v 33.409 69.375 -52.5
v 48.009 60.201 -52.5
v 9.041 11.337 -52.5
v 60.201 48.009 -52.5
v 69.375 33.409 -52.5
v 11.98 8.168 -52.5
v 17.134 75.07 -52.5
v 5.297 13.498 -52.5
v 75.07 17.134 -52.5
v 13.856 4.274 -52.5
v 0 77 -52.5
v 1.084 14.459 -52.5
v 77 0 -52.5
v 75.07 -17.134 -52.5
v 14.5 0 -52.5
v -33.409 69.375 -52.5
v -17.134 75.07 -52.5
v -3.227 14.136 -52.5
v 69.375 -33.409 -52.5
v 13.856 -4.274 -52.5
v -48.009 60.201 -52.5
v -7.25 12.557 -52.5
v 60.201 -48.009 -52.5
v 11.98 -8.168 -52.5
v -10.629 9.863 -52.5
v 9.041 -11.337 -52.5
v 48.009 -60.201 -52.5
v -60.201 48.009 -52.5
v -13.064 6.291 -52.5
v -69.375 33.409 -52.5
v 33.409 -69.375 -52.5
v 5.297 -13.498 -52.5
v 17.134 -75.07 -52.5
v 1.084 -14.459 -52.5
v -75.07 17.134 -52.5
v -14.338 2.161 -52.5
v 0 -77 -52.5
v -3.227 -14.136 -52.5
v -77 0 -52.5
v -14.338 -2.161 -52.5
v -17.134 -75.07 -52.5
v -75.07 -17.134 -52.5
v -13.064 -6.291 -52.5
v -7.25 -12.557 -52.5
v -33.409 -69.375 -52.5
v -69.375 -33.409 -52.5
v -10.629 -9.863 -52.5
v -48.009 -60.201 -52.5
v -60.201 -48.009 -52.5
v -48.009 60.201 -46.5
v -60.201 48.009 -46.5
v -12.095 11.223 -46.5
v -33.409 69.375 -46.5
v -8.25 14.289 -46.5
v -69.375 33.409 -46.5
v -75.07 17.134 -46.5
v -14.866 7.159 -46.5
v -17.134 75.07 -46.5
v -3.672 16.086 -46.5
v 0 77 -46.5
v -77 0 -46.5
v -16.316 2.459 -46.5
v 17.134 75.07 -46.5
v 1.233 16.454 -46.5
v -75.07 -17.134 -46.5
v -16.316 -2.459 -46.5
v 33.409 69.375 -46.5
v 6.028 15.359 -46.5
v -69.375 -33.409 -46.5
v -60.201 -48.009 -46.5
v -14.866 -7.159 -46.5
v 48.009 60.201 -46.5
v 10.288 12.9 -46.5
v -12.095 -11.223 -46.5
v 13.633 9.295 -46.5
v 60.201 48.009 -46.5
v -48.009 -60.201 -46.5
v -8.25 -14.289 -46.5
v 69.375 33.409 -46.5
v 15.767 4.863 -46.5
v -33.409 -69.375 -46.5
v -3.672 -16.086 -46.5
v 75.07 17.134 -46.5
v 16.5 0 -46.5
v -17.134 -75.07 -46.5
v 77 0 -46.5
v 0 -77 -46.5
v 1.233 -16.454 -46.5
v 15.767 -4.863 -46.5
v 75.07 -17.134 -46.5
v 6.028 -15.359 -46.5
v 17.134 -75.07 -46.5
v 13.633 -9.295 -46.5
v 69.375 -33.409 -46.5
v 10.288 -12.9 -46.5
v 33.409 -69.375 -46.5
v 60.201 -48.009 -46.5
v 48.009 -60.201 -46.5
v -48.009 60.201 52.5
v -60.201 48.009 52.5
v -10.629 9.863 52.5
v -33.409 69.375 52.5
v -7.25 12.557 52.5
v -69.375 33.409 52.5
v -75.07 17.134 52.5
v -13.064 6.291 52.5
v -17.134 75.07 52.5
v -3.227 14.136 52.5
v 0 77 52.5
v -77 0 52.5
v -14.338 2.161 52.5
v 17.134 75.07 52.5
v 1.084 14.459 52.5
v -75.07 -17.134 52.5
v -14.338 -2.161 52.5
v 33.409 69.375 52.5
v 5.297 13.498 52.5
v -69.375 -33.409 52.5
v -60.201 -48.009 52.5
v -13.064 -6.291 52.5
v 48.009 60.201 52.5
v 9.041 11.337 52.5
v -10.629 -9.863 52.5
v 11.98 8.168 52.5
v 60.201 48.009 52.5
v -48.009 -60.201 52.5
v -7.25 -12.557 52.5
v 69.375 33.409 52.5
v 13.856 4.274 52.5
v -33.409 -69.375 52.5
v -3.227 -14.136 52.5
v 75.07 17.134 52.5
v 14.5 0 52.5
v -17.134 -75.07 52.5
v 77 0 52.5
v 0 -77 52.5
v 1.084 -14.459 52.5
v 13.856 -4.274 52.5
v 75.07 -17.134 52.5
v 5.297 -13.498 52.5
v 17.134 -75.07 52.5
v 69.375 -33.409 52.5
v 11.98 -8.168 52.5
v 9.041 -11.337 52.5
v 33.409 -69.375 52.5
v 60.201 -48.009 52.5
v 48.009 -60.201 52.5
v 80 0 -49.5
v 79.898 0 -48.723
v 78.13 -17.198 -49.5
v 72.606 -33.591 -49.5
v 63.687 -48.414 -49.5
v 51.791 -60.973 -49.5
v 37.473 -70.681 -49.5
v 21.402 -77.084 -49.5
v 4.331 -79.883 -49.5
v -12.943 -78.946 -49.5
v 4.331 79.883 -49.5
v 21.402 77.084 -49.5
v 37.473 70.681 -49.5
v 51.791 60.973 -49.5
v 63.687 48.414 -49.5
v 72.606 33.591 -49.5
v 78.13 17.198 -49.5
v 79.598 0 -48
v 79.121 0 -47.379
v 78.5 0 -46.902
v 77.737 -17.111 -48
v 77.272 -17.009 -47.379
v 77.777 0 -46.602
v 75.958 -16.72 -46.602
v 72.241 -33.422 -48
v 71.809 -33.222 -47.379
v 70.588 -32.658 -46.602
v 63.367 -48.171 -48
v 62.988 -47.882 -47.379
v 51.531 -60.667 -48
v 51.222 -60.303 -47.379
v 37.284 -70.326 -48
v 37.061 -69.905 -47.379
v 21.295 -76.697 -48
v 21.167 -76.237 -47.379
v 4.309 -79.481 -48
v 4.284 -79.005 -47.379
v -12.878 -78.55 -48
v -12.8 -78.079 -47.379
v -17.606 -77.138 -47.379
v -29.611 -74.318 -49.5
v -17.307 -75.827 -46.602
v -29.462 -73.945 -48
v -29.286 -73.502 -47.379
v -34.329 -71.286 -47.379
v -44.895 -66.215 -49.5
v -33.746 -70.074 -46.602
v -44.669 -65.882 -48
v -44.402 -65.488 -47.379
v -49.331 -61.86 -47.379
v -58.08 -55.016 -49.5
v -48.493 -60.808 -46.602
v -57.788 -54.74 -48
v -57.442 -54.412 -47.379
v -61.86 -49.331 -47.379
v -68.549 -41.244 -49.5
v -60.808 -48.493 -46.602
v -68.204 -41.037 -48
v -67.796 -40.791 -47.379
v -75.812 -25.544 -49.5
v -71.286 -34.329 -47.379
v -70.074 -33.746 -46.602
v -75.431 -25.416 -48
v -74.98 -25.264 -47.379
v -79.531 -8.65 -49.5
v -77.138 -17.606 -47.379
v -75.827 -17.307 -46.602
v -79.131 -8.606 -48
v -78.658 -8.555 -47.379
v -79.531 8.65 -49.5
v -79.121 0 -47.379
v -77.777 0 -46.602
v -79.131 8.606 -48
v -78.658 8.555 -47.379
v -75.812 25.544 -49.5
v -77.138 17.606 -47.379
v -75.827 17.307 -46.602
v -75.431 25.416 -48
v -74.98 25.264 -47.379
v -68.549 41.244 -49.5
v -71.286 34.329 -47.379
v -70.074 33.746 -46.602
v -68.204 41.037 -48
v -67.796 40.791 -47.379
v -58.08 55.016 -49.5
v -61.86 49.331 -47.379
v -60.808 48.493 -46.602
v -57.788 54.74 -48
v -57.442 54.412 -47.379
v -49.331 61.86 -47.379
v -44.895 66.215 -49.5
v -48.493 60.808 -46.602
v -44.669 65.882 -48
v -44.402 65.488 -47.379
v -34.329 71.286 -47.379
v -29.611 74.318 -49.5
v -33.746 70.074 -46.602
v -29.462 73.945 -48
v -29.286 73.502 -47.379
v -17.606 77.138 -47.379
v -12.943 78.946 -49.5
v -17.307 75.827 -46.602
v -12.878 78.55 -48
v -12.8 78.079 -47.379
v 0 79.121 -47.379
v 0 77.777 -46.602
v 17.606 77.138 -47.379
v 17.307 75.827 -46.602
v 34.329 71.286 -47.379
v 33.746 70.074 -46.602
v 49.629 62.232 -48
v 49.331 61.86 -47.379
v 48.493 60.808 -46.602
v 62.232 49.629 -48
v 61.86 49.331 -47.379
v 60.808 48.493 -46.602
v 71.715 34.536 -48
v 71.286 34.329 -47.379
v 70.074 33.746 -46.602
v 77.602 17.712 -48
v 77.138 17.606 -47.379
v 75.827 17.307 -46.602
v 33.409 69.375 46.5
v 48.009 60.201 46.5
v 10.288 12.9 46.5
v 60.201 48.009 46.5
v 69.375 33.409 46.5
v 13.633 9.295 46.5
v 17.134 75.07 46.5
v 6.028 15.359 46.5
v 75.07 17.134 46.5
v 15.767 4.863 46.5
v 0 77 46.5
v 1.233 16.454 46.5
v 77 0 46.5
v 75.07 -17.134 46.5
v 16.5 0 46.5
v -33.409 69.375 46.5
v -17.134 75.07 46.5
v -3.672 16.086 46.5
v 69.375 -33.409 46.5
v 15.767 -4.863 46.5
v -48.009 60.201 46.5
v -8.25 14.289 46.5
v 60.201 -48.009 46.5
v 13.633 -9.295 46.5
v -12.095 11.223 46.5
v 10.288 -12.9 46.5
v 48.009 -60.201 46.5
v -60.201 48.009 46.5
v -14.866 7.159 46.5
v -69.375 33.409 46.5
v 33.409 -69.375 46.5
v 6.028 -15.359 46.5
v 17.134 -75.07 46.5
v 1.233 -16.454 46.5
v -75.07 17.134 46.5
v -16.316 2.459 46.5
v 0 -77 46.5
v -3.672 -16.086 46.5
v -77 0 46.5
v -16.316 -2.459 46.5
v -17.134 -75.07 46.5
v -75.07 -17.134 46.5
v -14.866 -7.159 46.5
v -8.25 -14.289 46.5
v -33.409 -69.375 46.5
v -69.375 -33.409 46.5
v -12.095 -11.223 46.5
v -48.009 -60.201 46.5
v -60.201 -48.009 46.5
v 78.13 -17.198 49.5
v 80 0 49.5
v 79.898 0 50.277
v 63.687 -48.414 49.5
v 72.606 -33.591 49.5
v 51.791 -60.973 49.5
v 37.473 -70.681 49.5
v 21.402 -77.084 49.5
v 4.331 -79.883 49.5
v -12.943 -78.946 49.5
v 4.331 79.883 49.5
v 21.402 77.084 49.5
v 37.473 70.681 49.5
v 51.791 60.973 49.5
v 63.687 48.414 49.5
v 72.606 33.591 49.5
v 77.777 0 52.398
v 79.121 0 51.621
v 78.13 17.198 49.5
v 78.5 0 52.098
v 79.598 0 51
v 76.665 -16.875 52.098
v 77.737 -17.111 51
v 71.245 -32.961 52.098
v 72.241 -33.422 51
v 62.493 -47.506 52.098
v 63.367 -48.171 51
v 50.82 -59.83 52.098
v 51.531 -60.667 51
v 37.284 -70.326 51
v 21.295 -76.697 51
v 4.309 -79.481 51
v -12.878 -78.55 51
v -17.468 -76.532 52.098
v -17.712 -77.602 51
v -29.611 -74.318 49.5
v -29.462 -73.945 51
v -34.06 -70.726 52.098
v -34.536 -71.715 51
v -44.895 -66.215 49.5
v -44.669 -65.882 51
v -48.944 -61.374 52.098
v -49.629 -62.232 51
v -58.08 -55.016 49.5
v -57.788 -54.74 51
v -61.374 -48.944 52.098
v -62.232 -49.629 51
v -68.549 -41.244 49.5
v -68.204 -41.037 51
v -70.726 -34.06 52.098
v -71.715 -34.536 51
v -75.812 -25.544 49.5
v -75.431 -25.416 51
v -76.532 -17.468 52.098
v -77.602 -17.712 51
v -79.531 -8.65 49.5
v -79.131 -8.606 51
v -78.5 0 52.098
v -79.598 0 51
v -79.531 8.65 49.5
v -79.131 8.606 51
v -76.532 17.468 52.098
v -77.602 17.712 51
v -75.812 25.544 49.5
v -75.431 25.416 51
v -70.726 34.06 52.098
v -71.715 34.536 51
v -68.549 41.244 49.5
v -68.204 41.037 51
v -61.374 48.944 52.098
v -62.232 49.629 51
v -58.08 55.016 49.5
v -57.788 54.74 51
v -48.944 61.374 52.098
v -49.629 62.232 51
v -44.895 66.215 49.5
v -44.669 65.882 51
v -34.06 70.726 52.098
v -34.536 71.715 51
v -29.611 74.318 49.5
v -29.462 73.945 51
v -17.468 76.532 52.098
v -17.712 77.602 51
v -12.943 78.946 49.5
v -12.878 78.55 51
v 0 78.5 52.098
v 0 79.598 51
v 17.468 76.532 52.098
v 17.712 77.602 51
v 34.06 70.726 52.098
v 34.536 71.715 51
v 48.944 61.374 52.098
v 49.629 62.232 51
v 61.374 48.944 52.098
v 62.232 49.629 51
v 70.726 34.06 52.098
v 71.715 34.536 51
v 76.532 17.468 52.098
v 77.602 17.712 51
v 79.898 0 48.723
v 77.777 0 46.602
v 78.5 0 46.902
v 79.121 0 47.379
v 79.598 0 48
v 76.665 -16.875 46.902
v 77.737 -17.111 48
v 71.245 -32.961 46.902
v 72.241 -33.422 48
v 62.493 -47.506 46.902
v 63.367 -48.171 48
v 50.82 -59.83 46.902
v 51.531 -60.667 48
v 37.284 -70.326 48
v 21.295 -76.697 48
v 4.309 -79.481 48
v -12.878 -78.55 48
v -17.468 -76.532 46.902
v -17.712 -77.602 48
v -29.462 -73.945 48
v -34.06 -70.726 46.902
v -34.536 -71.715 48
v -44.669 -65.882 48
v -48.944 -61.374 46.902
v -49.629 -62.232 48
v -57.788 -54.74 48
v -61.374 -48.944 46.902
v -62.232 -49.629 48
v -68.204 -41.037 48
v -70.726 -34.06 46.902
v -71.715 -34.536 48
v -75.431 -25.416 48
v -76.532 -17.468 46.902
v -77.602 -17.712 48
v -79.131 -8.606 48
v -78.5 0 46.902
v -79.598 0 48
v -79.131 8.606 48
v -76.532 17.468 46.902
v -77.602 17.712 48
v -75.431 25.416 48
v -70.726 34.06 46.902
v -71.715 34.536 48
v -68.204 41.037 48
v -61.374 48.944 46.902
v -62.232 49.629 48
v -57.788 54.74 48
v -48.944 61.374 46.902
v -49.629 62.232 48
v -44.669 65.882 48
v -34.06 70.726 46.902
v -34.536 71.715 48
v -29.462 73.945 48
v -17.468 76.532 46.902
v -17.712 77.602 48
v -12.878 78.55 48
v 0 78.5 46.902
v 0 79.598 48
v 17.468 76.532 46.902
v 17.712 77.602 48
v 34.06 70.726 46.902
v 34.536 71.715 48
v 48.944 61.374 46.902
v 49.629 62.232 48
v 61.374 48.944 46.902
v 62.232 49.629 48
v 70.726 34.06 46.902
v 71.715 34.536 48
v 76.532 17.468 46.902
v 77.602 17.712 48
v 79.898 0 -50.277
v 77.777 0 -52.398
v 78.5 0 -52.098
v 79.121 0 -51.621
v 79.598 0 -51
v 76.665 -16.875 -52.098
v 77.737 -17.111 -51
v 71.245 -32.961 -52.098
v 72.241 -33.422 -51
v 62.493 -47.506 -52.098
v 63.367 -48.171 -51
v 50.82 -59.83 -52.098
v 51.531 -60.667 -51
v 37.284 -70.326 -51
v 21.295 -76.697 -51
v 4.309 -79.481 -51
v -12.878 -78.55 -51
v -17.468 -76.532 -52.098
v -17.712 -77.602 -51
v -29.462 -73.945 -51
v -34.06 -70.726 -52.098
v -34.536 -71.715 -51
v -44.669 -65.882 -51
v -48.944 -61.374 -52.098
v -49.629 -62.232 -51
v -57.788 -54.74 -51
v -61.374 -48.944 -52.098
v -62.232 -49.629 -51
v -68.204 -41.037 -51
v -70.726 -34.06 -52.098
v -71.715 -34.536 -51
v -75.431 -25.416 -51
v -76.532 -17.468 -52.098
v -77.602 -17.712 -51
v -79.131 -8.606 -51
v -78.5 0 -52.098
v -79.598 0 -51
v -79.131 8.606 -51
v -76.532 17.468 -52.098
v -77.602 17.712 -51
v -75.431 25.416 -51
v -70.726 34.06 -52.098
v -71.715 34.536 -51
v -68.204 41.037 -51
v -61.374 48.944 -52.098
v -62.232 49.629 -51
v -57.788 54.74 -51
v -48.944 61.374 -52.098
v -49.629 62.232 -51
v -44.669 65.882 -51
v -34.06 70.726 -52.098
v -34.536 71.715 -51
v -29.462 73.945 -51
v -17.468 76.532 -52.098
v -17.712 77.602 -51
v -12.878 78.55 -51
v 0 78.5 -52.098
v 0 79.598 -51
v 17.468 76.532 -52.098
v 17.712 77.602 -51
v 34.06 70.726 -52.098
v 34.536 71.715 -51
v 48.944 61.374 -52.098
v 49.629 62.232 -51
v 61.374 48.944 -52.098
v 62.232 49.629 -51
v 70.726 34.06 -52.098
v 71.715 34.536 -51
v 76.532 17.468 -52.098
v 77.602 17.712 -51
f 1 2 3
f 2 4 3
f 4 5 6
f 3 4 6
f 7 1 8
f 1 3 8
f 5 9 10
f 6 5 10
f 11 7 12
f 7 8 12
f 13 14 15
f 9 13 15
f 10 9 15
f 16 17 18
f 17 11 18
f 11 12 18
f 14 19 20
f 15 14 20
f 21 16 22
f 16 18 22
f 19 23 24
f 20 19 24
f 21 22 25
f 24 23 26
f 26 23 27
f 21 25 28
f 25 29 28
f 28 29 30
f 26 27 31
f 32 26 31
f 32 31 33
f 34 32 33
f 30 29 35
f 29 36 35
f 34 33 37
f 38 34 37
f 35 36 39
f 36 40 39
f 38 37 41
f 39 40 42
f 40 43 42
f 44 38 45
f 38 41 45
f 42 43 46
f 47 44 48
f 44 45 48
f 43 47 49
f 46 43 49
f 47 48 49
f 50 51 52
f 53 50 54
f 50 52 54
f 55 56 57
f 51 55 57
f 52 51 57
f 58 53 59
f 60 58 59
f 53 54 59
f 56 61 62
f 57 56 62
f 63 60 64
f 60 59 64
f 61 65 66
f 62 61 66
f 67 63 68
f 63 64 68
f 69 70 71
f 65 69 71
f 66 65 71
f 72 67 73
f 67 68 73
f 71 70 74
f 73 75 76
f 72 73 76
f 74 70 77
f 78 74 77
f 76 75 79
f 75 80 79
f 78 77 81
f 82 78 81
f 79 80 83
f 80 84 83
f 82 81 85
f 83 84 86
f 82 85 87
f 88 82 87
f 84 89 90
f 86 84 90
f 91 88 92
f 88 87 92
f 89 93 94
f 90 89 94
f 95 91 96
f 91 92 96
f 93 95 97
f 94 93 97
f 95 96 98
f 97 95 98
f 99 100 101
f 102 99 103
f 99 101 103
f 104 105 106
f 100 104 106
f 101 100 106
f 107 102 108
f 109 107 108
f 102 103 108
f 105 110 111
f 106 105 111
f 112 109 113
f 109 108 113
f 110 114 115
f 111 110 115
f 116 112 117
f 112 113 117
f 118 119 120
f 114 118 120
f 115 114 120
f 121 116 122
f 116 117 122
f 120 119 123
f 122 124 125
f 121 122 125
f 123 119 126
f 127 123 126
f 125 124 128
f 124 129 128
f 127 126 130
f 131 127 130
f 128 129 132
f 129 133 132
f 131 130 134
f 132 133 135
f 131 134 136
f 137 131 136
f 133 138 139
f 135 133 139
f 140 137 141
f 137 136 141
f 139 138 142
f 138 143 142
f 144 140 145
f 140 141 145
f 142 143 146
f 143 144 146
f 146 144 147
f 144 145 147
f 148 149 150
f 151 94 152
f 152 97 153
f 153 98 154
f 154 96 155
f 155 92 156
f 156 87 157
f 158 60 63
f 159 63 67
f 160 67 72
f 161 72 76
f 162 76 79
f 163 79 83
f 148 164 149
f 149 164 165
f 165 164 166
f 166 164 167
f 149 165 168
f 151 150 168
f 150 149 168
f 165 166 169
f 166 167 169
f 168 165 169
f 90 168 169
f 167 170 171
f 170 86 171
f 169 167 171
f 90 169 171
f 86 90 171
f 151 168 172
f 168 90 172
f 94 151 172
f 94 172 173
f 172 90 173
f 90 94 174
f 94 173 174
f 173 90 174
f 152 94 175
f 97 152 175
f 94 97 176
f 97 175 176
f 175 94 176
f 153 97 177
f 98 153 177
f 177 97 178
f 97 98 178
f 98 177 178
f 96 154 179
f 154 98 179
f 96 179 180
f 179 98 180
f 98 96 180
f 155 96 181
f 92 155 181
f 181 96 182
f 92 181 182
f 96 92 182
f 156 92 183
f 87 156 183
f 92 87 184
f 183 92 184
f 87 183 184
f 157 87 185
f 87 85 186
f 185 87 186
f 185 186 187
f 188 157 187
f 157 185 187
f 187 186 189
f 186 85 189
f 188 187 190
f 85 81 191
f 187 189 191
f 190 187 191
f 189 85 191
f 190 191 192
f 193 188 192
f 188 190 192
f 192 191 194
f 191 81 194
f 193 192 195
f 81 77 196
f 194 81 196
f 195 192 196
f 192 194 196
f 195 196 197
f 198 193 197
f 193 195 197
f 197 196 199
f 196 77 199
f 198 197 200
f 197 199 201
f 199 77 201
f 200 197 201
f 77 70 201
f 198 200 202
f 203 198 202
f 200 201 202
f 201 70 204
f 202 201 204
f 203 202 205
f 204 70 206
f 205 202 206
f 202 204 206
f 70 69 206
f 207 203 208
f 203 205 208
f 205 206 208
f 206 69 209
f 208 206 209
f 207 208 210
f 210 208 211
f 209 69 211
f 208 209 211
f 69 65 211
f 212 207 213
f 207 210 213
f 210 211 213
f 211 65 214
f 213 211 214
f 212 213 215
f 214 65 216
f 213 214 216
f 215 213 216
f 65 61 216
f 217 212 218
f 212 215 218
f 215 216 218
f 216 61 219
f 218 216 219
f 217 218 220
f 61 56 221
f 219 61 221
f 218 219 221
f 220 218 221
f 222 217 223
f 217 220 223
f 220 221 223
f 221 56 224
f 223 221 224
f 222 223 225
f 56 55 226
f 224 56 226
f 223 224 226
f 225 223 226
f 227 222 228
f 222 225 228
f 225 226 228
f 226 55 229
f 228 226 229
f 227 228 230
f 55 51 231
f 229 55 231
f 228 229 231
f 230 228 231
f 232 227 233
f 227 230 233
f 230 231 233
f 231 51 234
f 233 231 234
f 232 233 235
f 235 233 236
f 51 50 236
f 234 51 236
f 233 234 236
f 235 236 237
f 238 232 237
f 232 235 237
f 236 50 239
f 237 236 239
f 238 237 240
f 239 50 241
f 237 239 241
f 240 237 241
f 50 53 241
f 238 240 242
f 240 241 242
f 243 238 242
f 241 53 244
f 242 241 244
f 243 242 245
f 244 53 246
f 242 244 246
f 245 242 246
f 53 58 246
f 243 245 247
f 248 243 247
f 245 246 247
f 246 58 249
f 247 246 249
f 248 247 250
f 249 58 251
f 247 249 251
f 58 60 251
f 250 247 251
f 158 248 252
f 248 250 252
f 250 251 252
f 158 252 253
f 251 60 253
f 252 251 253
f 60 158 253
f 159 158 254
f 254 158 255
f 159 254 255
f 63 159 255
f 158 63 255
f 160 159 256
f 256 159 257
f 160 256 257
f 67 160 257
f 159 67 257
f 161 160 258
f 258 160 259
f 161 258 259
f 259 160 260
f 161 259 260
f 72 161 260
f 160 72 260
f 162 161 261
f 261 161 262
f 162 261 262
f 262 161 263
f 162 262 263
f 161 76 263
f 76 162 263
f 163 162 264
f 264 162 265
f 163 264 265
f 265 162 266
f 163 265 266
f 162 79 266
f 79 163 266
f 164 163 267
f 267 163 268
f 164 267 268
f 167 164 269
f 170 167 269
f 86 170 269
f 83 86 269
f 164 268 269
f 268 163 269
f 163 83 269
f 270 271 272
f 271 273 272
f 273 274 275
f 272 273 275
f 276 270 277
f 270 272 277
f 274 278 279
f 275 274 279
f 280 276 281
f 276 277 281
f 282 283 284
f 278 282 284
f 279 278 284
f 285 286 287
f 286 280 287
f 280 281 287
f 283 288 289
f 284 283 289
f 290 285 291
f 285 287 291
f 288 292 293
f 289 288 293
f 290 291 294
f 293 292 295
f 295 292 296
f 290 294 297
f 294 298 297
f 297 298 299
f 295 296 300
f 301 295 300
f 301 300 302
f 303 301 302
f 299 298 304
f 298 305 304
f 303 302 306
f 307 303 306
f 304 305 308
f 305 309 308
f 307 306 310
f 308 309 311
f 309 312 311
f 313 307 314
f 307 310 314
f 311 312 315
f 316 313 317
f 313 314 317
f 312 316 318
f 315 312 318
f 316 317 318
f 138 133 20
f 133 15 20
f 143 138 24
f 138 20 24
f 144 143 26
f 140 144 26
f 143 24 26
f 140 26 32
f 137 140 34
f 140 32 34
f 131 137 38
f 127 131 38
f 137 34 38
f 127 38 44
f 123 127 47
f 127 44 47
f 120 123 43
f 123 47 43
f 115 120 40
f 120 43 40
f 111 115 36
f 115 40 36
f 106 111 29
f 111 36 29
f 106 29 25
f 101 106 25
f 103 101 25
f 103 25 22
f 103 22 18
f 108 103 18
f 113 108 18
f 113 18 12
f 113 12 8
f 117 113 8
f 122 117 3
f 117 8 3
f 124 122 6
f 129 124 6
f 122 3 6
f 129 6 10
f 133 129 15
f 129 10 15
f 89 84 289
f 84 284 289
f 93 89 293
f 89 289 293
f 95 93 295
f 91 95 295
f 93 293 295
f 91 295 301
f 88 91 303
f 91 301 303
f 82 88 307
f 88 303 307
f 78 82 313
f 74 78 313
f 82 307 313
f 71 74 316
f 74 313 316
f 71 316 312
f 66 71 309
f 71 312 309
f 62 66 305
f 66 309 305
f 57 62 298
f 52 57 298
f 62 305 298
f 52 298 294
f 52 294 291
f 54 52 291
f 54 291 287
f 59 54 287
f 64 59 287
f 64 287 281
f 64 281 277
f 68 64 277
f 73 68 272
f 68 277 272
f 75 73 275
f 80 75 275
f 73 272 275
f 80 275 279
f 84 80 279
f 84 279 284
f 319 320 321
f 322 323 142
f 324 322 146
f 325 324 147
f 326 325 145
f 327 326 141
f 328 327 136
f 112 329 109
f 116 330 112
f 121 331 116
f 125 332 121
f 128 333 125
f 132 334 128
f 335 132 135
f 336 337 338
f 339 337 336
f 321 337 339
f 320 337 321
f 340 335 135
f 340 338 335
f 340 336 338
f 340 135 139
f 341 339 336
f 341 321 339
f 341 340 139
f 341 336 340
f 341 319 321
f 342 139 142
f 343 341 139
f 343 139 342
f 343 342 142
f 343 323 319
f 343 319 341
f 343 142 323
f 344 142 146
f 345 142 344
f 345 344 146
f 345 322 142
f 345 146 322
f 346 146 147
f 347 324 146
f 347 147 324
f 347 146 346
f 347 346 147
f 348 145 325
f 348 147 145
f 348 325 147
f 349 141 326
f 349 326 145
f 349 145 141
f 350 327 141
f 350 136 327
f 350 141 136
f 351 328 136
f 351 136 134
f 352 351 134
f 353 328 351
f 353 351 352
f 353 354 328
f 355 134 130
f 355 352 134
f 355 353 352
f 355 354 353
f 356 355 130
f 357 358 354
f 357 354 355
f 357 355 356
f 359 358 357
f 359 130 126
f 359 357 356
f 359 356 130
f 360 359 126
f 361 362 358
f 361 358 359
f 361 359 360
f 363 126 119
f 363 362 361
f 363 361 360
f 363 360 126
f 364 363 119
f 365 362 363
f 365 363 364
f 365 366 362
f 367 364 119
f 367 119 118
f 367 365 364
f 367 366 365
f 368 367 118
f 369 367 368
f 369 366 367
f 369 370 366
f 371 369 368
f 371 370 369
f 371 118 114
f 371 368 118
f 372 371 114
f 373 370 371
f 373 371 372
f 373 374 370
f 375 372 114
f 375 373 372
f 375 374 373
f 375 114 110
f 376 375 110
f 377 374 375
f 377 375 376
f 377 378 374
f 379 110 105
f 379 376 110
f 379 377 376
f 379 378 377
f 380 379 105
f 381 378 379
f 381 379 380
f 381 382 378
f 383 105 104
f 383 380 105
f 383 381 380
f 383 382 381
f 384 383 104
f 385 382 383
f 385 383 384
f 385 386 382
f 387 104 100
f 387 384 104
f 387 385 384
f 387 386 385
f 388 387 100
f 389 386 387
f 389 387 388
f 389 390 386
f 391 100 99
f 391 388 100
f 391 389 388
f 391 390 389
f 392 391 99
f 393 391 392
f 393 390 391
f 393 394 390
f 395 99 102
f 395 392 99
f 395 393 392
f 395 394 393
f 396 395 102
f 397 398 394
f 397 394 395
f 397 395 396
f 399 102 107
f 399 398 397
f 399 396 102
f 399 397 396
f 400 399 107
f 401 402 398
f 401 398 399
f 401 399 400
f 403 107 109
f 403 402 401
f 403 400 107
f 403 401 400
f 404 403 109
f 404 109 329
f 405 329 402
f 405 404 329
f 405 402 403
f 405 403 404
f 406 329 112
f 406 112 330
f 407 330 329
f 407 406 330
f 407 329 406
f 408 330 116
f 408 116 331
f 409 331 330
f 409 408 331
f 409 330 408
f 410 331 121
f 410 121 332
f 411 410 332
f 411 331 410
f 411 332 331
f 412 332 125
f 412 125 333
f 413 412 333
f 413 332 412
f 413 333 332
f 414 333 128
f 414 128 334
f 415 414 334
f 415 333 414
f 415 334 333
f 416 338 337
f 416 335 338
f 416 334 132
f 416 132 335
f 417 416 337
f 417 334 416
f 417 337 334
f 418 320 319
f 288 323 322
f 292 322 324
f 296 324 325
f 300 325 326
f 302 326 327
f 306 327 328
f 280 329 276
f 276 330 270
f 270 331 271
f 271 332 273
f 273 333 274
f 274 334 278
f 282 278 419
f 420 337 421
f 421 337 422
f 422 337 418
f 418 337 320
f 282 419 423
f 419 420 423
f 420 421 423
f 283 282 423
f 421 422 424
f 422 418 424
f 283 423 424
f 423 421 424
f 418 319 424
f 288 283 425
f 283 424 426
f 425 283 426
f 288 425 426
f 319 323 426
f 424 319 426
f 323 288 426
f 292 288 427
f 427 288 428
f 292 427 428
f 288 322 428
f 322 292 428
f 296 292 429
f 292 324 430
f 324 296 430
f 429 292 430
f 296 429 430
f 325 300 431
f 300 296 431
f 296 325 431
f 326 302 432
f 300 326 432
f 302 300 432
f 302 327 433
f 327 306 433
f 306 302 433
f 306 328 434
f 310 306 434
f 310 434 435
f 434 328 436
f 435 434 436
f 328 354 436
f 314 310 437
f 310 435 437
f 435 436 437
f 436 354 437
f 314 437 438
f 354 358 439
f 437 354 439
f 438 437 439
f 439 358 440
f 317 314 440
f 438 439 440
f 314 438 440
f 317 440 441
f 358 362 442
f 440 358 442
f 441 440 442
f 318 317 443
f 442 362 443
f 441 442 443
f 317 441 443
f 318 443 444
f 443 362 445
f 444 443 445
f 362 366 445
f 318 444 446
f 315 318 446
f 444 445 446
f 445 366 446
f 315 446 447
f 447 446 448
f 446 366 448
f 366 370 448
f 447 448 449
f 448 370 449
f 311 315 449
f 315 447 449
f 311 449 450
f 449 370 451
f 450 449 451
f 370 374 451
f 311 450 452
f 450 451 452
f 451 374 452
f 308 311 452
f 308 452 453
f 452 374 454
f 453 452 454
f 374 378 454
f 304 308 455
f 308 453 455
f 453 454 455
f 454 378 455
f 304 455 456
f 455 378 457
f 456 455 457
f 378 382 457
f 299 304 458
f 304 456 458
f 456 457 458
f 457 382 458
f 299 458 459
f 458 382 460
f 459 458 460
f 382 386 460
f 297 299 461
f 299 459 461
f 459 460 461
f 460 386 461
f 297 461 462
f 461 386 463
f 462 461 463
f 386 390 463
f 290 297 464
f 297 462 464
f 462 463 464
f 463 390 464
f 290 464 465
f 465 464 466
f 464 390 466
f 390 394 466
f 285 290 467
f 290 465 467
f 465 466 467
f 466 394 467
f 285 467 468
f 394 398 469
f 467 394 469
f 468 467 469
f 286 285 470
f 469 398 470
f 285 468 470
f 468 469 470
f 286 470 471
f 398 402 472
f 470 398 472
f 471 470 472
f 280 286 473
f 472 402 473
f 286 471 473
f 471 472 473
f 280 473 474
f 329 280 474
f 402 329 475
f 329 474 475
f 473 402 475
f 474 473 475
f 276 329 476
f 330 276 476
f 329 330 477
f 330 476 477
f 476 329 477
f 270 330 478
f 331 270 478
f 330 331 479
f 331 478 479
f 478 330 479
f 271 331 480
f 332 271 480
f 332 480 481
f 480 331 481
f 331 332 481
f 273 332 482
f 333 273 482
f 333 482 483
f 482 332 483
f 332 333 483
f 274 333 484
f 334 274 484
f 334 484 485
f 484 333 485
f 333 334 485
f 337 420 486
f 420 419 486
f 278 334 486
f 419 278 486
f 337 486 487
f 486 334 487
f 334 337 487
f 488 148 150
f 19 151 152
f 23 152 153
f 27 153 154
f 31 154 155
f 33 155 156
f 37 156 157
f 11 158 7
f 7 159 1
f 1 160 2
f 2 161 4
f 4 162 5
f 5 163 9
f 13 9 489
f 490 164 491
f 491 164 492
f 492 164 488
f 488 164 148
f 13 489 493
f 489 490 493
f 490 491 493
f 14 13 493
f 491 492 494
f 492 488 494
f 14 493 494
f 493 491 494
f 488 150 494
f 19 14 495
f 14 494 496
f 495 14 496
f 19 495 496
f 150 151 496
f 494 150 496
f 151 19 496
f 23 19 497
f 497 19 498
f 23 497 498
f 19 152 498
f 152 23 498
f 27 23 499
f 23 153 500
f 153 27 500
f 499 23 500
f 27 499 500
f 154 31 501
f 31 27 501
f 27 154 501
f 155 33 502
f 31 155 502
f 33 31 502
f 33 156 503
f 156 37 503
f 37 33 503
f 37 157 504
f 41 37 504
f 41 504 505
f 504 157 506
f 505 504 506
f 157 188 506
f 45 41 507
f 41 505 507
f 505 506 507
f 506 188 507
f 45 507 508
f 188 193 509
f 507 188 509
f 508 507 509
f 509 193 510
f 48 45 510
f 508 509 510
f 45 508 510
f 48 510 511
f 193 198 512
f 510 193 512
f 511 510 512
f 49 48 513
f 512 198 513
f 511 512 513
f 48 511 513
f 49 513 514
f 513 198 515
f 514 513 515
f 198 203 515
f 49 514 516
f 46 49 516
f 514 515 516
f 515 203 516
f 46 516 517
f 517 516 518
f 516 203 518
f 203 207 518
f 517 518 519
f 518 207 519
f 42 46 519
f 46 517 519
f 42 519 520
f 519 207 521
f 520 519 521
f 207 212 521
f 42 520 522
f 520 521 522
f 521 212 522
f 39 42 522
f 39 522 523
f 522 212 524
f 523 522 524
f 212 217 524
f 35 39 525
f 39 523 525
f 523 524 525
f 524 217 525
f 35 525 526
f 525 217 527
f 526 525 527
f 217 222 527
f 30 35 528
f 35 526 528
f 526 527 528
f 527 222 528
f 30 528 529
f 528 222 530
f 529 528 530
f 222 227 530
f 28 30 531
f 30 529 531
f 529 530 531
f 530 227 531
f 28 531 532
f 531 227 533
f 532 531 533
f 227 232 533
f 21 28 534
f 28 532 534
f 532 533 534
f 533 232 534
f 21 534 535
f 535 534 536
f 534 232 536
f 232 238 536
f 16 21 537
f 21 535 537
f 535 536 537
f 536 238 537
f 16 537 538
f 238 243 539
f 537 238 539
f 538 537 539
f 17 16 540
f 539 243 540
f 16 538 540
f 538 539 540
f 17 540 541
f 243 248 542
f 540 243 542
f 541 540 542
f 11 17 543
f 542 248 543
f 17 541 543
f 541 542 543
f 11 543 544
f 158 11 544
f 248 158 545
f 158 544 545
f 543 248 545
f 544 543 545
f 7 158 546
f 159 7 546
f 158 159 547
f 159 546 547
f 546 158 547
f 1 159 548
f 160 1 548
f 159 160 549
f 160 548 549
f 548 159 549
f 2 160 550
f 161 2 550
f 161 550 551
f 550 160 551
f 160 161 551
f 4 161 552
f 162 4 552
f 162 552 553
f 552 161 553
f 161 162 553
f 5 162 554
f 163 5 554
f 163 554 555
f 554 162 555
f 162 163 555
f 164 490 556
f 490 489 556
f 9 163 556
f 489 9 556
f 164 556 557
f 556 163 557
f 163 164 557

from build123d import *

# Parameters (mm, degrees)
FILLET1_R = 3


with BuildPart() as part:
    # Sketch1 → Revolve1 (revolve)
    with BuildSketch(Plane(origin=(0, 0, 0), x_dir=(0, 0, -1), z_dir=(1, 0, 0)), mode=Mode.PRIVATE) as revolve1_sk:
        Polygon((-52.5, 80), (-52.5, 14.5), (52.5, 14.5), (52.5, 80), (46.5, 80), (46.5, 16.5), (-46.5, 16.5), (-46.5, 80), align=None)
    revolve(revolve1_sk.sketch.rotate(Axis((0, 0, 0), (0, 0, -1)), 90), axis=Axis((0, 0, 0), (0, 0, -1)))

    # Fillet1
    fillet1_edges = [part.edges().sort_by_distance(p)[0] for p in [
        (-80, 0, 46.5),
        (-80, 0, -46.5),
        (-80, 0, -52.5),
        (-80, 0, 52.5),
    ]]
    fillet(fillet1_edges, radius=FILLET1_R - 0.0001)  # a hair under: the kernel refuses the full size


solid = part.part
